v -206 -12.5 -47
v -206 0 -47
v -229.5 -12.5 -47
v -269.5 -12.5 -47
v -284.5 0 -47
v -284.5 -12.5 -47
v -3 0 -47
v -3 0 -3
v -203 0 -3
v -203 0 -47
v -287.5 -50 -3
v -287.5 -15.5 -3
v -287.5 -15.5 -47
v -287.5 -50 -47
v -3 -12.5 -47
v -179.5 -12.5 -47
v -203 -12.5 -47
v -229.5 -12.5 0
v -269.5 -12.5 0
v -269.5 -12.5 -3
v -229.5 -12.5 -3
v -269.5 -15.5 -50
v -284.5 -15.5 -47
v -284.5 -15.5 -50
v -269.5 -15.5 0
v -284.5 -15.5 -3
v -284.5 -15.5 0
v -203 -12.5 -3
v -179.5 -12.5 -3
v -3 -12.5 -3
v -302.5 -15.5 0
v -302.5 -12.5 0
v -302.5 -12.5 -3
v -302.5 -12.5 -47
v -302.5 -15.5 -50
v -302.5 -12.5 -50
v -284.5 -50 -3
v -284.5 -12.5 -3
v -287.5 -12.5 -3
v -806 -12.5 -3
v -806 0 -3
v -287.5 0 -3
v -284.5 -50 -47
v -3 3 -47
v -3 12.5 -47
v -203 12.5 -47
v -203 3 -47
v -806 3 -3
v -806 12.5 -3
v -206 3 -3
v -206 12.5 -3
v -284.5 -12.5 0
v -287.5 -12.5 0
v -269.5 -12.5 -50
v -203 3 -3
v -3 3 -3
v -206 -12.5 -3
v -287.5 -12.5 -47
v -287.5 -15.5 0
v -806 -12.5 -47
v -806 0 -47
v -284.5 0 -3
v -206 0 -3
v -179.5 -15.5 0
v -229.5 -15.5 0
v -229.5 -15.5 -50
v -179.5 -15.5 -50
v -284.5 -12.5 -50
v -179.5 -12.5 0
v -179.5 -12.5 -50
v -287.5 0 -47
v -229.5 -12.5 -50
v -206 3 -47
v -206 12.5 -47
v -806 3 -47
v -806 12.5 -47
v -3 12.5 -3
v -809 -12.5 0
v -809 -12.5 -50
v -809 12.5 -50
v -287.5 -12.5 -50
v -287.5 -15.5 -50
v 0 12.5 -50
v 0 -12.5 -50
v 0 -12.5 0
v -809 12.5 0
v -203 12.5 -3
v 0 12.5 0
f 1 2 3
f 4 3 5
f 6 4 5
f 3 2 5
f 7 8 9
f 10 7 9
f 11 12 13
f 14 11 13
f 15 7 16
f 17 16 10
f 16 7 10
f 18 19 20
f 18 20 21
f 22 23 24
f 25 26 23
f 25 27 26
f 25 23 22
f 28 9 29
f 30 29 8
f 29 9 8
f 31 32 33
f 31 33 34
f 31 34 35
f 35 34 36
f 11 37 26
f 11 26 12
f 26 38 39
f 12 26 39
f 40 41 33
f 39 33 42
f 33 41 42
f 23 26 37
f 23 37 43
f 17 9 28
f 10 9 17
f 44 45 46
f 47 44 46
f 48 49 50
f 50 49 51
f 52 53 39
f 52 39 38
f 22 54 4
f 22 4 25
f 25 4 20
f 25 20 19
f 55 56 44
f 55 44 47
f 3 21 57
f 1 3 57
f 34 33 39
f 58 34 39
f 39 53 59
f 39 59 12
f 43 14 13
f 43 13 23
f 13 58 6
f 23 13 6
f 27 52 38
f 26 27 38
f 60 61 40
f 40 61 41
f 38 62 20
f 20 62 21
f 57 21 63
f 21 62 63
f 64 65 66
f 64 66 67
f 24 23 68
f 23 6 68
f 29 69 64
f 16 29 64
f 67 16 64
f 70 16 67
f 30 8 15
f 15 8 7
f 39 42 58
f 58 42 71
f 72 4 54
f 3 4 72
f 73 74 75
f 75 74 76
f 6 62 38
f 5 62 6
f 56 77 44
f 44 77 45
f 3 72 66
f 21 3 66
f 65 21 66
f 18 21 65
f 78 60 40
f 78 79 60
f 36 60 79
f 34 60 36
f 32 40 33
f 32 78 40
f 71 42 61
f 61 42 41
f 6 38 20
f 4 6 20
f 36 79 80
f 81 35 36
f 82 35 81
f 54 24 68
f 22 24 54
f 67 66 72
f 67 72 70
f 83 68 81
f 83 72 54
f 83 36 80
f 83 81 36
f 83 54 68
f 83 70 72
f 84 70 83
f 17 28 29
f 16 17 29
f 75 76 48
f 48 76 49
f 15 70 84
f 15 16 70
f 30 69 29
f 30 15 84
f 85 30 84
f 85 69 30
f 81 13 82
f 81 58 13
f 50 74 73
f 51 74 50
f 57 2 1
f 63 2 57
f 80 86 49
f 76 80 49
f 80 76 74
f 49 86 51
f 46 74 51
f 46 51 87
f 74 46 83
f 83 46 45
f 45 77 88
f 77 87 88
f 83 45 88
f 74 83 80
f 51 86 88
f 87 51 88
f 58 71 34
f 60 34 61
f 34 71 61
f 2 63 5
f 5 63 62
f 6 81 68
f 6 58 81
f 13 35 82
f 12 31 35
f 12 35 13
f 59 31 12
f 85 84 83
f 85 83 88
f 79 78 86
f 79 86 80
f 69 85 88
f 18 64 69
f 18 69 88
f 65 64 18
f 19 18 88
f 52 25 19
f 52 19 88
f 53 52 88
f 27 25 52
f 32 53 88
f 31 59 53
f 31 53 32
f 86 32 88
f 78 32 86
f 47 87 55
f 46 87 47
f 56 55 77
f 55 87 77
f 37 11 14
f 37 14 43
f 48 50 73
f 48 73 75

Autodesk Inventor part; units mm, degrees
ref_plane "YZ Plane" through (0, 0, 0) normal (1, 0, 0) x (0, 1, 0)
ref_plane "XZ Plane" through (0, 0, 0) normal (0, 1, 0) x (-1, 0, 0)
ref_plane "XY Plane" through (0, 0, 0) normal (0, 0, 1) x (1, 0, 0)
sketch "Sketch1" plane through (0, 0, 0) normal (0, 1, 0) x (-1, 0, 0)
  line L0 (0, 0) -> (809, 0)
  line L1 (809, 0) -> (809, -50)
  line L2 (809, -50) -> (0, -50)
  line L3 (0, -50) -> (0, 0)
  dimension "d0" = 809
  dimension "d1" = 50
extrude "Extrusion1" add sketch "Sketch1" along normal blind 3
sketch "Sketch2" plane through (0, 0, 0) normal (0, -1, 0) x (1, 0, 0)
  line L0 (-806, -3) -> (-3, -3)
  line L1 (-3, -3) -> (-3, -47)
  line L2 (-3, -47) -> (-806, -47)
  line L3 (-806, -47) -> (-806, -3)
  line L4 (-809, 0) -> (0, 0) projected
  line L5 (-809, 0) -> (-809, -50) projected
  line L6 (-206, -3) -> (-203, -3)
  line L7 (-203, -3) -> (-203, -47)
  line L8 (-203, -47) -> (-206, -47)
  line L9 (-206, -47) -> (-206, -3)
  line L10 (0, -50) -> (-809, -50) projected
  line L11 (-809, 0) -> (0, 0)
  line L12 (0, 0) -> (0, -50)
  line L13 (0, -50) -> (-809, -50)
  line L14 (-809, -50) -> (-809, 0)
  dimension "d4" = 803
  dimension "d5" = 44
  dimension "d6" = 3
  dimension "d7" = 3
  dimension "d8" = 3
  dimension "d9" = 600
extrude "Extrusion2" add sketch "Sketch2" along normal blind 12.5 and the other way blind 12.5 contours L0 L7 L2 L9 | L4 L12 L10 L5
sketch "Sketch3" plane through (0, -12.5, 0) normal (0, -1, 0) x (1, 0, 0)
  line L0 (0, 0) -> (-809, 0) projected
  line L1 (0, -50) -> (-809, -50) projected
  line L2 (-229.5, 0) -> (-179.5, 0)
  line L3 (-179.5, 0) -> (-179.5, -50)
  line L4 (-179.5, -50) -> (-229.5, -50)
  line L5 (-229.5, -50) -> (-229.5, 0)
  line L6 (-203, -47) -> (-203, -3) projected
  line L7 (-809, 0) -> (0, 0) projected
  line L8 (-269.5, 0) -> (-284.5, 0)
  line L9 (-284.5, 0) -> (-284.5, -50)
  line L10 (-284.5, -50) -> (-269.5, -50)
  line L11 (-269.5, -50) -> (-269.5, 0)
  line L12 (-809, -50) -> (0, -50) projected
  line L13 (-284.5, 0) -> (-287.5, 0)
  line L14 (-287.5, 0) -> (-287.5, -50)
  line L15 (-287.5, -50) -> (-284.5, -50)
  line L16 (-284.5, -50) -> (-284.5, 0)
  line L17 (-287.5, 0) -> (-302.5, 0)
  line L18 (-302.5, 0) -> (-302.5, -50)
  line L19 (-302.5, -50) -> (-287.5, -50)
  line L20 (-287.5, -50) -> (-287.5, 0)
  dimension "d14" = 50
  dimension "d15" = 23.5
  dimension "d18" = 15
  dimension "d19" = 40
  dimension "d24" = 3
  dimension "d25" = 15
  dimension "d26" = 50
extrude "Extrusion3" add sketch "Sketch3" along normal blind 3 contours L3 L1 L5 L0 | L11 L1 L9 L0 | L14 L1 L18 L0
sketch "Sketch4" plane through (0, 0, 0) normal (0, -1, 0) x (1, 0, 0)
  line L0 (-284.5, -3) -> (-284.5, -47) projected
  line L1 (-284.5, -3) -> (-287.5, -3)
  line L2 (-287.5, -3) -> (-287.5, -47)
  line L3 (-287.5, -47) -> (-284.5, -47)
  line L4 (-284.5, -47) -> (-284.5, -3)
  point P0 (0, 0)
  dimension "d20" = 3
  dimension "d21" = 44
extrude "Extrusion4" add sketch "Sketch4" along normal blind 50
properties part number "Boom" material "Wood (Birch)"
